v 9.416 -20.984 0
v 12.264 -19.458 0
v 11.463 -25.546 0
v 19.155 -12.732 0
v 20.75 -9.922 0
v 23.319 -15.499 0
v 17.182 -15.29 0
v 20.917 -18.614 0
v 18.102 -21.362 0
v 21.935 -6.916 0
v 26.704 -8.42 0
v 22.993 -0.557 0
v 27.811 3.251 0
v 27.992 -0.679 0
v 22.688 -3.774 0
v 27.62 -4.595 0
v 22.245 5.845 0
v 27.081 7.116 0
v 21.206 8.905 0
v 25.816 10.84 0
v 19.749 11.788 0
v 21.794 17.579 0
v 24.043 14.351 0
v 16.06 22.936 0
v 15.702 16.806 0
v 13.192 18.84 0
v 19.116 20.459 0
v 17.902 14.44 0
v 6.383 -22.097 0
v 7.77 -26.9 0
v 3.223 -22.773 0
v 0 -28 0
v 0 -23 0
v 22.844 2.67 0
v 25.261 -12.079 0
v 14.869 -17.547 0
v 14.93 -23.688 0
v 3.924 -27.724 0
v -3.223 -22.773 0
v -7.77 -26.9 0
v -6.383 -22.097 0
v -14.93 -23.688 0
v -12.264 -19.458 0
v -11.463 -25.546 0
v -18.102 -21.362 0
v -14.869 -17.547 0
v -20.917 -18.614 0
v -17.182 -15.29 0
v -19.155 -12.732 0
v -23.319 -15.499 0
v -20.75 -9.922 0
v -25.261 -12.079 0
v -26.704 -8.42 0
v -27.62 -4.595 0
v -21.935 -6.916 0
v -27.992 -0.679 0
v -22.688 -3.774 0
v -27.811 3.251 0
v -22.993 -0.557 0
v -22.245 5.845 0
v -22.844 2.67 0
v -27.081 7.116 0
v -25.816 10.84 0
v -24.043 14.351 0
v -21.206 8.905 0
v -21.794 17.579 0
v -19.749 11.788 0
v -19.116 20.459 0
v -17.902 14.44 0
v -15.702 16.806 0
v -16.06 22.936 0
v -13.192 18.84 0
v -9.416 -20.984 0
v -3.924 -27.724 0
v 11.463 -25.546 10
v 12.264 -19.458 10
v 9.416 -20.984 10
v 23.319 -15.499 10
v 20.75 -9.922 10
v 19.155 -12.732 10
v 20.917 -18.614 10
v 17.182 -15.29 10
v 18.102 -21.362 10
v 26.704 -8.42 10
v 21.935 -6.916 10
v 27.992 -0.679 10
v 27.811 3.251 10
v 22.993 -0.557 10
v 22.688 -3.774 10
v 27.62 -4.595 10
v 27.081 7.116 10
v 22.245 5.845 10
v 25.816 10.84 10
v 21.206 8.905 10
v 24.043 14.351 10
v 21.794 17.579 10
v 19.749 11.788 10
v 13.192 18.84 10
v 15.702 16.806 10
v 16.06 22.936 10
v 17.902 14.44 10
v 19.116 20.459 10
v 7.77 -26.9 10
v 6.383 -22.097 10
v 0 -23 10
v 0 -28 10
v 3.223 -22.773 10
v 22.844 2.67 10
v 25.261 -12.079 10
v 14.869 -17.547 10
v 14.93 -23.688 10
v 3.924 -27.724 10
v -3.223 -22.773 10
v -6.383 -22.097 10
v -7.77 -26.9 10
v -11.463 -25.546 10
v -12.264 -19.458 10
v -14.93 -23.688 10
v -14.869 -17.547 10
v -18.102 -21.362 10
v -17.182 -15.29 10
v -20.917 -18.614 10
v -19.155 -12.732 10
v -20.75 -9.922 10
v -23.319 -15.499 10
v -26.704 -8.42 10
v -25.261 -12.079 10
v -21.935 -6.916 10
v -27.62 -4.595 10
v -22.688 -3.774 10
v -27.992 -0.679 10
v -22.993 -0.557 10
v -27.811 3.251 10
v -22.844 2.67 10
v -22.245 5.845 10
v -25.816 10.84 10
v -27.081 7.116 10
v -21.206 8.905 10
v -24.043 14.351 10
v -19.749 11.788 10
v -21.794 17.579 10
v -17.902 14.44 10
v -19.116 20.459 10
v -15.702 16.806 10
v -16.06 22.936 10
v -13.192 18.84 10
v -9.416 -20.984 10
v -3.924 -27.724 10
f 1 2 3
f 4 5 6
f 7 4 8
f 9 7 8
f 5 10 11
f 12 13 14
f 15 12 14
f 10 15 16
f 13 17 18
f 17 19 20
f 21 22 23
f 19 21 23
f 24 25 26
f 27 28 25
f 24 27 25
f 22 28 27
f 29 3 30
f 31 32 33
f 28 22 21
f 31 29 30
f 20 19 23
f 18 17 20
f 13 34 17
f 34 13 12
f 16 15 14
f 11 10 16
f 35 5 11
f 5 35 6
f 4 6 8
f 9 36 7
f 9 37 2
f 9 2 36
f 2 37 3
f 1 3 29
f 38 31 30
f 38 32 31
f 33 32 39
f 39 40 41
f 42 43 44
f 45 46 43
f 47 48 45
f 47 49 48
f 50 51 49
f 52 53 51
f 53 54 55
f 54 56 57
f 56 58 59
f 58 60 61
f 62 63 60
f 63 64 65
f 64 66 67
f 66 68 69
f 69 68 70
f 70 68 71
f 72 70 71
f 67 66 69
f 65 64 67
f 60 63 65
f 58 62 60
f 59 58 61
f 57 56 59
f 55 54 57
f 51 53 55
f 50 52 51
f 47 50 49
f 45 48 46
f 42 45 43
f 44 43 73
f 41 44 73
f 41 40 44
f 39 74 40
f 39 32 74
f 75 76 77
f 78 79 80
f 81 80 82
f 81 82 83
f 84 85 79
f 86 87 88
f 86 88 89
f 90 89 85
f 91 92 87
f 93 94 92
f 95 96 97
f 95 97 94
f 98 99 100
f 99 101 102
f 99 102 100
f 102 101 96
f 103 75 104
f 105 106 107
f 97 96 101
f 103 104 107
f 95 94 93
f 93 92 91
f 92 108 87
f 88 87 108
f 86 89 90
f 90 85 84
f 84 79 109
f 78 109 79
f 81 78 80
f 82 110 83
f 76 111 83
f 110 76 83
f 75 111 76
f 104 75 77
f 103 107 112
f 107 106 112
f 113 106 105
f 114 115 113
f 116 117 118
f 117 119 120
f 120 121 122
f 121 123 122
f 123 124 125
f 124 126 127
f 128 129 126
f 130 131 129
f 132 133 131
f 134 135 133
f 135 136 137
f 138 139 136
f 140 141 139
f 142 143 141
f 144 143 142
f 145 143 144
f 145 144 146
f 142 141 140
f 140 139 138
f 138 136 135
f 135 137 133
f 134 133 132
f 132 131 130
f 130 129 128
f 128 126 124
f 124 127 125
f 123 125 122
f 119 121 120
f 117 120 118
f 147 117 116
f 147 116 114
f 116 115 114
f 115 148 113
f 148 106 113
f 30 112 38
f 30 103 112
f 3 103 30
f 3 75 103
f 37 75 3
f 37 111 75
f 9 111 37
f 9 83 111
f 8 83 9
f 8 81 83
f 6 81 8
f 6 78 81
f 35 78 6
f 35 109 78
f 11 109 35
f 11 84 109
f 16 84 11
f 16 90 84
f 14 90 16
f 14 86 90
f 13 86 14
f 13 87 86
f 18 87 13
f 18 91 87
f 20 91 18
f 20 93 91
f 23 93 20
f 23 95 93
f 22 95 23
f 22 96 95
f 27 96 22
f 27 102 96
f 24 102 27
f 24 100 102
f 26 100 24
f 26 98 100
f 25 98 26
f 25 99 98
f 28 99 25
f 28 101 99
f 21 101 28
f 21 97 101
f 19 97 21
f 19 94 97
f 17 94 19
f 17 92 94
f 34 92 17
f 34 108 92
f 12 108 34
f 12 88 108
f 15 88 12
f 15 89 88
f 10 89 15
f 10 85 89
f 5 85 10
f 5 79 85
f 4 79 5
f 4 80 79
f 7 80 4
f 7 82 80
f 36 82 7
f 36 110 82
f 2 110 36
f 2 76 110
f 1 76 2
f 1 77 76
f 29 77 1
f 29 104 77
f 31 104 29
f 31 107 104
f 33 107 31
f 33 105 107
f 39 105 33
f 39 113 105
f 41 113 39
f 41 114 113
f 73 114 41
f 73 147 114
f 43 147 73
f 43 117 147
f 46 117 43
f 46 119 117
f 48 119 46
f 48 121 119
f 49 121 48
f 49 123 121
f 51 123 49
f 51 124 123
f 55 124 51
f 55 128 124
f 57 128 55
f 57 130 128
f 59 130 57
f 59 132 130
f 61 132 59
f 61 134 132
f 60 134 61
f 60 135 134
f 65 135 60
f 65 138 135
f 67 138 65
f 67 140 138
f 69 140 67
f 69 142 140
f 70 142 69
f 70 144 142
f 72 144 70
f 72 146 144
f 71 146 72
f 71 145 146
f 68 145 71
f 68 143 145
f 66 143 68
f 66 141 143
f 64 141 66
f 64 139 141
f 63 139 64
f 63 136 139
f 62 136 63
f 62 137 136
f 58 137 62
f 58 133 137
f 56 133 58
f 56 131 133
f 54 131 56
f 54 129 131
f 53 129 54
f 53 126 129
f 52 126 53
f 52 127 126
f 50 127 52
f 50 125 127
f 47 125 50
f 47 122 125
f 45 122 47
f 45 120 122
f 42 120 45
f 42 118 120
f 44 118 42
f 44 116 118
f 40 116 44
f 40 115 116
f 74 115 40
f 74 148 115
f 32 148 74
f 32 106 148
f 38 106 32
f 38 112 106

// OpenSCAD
$fn = 32;

// ----------------------------------------------------------------------
// Spring clip: 56 mm outside, 5 mm band, 70 degree opening
// ----------------------------------------------------------------------

// --- parameters (mm) ---
outer_r = 28;             // clip outside radius
inner_r = 23;             // clip bore radius
band = 5;                 // band thickness
clip_w = 10;              // clip width
opening = 70;             // opening angle

clip_profile = [[-16.06, 22.936], [-19.116, 20.459], [-21.794, 17.579], [-24.043, 14.351], [-25.816, 10.84], [-27.081, 7.116], [-27.811, 3.251], [-27.992, -0.679], [-27.62, -4.595], [-26.704, -8.42], [-25.261, -12.079], [-23.319, -15.499], [-20.917, -18.614], [-18.102, -21.362], [-14.93, -23.688], [-11.463, -25.546], [-7.77, -26.9], [-3.924, -27.724], [0, -28], [3.924, -27.724], [7.77, -26.9], [11.463, -25.546], [14.93, -23.688], [18.102, -21.362], [20.917, -18.614], [23.319, -15.499], [25.261, -12.079], [26.704, -8.42], [27.62, -4.595], [27.992, -0.679], [27.811, 3.251], [27.081, 7.116], [25.816, 10.84], [24.043, 14.351], [21.794, 17.579], [19.116, 20.459], [16.06, 22.936], [13.192, 18.84], [15.702, 16.806], [17.902, 14.44], [19.749, 11.788], [21.206, 8.905], [22.245, 5.845], [22.844, 2.67], [22.993, -0.557], [22.688, -3.774], [21.935, -6.916], [20.75, -9.922], [19.155, -12.732], [17.182, -15.29], [14.869, -17.547], [12.264, -19.458], [9.416, -20.984], [6.383, -22.097], [3.223, -22.773], [0, -23], [-3.223, -22.773], [-6.383, -22.097], [-9.416, -20.984], [-12.264, -19.458], [-14.869, -17.547], [-17.182, -15.29], [-19.155, -12.732], [-20.75, -9.922], [-21.935, -6.916], [-22.688, -3.774], [-22.993, -0.557], [-22.844, 2.67], [-22.245, 5.845], [-21.206, 8.905], [-19.749, 11.788], [-17.902, 14.44], [-15.702, 16.806], [-13.192, 18.84]];

difference() {
  union() {
    linear_extrude(height = clip_w) polygon(clip_profile);
  }
}
